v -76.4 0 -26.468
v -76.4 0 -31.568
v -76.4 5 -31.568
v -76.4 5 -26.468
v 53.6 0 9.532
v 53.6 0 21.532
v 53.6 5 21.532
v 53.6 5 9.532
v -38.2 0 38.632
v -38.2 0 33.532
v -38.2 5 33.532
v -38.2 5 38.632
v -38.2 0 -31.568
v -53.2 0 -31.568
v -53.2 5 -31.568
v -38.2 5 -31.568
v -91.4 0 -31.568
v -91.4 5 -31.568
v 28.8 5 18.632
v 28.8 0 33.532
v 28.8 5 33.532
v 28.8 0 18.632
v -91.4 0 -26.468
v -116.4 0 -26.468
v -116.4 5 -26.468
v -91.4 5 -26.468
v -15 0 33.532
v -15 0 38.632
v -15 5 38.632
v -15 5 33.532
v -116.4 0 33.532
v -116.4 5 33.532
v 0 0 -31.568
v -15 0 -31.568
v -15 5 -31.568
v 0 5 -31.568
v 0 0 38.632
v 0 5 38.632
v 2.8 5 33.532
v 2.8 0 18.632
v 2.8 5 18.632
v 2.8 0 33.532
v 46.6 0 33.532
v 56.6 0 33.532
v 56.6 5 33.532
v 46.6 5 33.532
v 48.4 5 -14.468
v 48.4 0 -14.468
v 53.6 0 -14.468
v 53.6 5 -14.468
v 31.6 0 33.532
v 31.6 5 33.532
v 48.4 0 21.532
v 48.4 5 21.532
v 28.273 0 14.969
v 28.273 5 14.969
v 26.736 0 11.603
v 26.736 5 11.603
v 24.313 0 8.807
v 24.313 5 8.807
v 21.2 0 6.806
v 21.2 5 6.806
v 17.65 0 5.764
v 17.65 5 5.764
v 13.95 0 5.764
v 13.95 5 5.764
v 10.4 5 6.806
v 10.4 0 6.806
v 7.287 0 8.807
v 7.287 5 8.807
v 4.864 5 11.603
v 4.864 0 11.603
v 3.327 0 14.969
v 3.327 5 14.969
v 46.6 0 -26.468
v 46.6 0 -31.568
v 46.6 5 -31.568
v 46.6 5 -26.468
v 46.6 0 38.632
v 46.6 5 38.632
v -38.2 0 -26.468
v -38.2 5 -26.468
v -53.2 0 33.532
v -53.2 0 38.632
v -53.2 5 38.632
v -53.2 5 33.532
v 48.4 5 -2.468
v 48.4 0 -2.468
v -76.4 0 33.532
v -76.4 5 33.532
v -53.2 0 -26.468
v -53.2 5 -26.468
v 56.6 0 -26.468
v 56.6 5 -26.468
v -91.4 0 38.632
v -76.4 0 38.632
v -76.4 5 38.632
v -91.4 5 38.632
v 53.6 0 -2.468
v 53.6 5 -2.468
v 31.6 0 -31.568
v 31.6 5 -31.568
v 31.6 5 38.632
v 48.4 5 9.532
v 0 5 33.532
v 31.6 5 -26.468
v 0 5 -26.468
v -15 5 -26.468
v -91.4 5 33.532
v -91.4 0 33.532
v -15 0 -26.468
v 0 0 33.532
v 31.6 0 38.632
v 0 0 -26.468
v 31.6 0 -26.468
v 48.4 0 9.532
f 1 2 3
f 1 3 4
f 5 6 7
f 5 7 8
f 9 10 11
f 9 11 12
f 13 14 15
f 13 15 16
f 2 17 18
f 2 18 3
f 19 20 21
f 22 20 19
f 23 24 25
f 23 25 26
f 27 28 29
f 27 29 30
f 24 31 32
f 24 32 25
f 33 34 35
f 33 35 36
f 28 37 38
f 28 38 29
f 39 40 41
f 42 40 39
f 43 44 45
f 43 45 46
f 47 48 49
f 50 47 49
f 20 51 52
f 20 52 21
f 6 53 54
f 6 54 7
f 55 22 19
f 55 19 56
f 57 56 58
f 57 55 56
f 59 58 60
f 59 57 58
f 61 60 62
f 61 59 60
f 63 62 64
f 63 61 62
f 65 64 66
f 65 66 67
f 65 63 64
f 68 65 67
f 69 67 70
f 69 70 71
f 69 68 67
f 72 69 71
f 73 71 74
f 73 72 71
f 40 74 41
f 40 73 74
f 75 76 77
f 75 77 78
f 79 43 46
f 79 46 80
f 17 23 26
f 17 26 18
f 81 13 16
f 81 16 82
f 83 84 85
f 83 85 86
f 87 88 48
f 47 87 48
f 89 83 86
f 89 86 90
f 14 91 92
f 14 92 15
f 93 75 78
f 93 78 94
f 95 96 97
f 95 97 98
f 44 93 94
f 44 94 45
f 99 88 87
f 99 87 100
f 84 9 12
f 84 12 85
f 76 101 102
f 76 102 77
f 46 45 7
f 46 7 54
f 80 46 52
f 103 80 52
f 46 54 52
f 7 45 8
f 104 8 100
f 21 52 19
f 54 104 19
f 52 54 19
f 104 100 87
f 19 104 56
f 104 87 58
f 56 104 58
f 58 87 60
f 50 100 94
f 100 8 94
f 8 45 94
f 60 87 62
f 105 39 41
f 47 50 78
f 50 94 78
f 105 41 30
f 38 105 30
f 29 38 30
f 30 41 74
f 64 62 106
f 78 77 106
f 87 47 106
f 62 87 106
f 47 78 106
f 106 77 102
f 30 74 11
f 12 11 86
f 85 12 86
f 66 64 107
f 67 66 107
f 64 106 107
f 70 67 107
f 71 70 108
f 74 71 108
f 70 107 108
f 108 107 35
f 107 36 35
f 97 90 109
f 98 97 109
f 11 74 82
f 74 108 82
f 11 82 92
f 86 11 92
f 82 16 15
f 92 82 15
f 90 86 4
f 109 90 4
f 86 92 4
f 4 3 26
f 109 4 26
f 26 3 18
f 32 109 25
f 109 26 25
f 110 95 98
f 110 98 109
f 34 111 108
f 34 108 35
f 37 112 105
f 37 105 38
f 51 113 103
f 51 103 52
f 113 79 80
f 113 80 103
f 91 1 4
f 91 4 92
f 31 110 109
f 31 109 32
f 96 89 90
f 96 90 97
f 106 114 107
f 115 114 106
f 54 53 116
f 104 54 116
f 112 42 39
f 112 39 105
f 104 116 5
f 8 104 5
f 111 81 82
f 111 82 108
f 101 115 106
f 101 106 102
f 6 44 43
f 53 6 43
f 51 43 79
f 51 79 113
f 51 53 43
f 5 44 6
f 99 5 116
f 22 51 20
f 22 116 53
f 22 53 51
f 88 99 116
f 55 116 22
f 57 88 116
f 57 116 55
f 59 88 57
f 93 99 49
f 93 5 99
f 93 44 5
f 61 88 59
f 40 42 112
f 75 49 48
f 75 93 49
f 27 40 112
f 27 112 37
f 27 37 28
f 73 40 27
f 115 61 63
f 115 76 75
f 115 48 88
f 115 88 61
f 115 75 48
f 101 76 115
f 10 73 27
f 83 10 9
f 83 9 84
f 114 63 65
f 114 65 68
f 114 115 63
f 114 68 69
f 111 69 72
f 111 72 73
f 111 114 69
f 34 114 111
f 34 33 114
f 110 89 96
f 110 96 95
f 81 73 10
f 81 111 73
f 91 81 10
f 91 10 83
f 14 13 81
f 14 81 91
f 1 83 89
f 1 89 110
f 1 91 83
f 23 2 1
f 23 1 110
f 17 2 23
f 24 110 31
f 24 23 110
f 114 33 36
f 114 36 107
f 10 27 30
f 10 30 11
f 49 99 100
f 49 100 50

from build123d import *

# Parameters (mm, degrees)
SKETCH1_W           = 5.2
SKETCH1_H           = 12
BOSS_EXTRUDE1_DEPTH = 5


with BuildPart() as part:
    # Sketch1 → Boss-Extrude1 (new body)
    with BuildSketch(Plane(origin=(0, 0, 0), x_dir=(1, 0, 0), z_dir=(0, 1, 0))):
        with BuildLine():
            Line((56.6, 26.468421053), (56.6, -33.531578947))
            Line((56.6, -33.531578947), (46.6, -33.531578947))
            Line((46.6, -33.531578947), (46.6, -38.631578947))
            Line((46.6, -38.631578947), (31.6, -38.631578947))
            Line((31.6, -38.631578947), (31.6, -33.531578947))
            Line((31.6, -33.531578947), (28.8, -33.531578947))
            Line((28.8, -33.531578947), (28.8, -18.631578947))
            ThreePointArc((28.8, -18.631578947), (15.8, -5.631578947), (2.8, -18.631578947))
            Line((2.8, -18.631578947), (2.8, -33.531578947))
            Line((2.8, -33.531578947), (0, -33.531578947))
            Line((0, -33.531578947), (0, -38.631578947))
            Line((0, -38.631578947), (-15, -38.631578947))
            Line((-15, -38.631578947), (-15, -33.531578947))
            Line((-15, -33.531578947), (-38.2, -33.531578947))
            Line((-38.2, -33.531578947), (-38.2, -38.631578947))
            Line((-38.2, -38.631578947), (-53.2, -38.631578947))
            Line((-53.2, -38.631578947), (-53.2, -33.531578947))
            Line((-53.2, -33.531578947), (-76.4, -33.531578947))
            Line((-76.4, -33.531578947), (-76.4, -38.631578947))
            Line((-76.4, -38.631578947), (-91.4, -38.631578947))
            Line((-91.4, -38.631578947), (-91.4, -33.531578947))
            Line((-91.4, -33.531578947), (-116.4, -33.531578947))
            Line((-116.4, -33.531578947), (-116.4, 26.468421053))
            Line((-116.4, 26.468421053), (-91.4, 26.468421053))
            Line((-91.4, 26.468421053), (-91.4, 31.568421053))
            Line((-91.4, 31.568421053), (-76.4, 31.568421053))
            Line((-76.4, 31.568421053), (-76.4, 26.468421053))
            Line((-76.4, 26.468421053), (-53.2, 26.468421053))
            Line((-53.2, 26.468421053), (-53.2, 31.568421053))
            Line((-53.2, 31.568421053), (-38.2, 31.568421053))
            Line((-38.2, 31.568421053), (-38.2, 26.468421053))
            Line((-38.2, 26.468421053), (-15, 26.468421053))
            Line((-15, 26.468421053), (-15, 31.568421053))
            Line((-15, 31.568421053), (0, 31.568421053))
            Line((0, 31.568421053), (0, 26.468421053))
            Line((0, 26.468421053), (31.6, 26.468421053))
            Line((31.6, 26.468421053), (31.6, 31.568421053))
            Line((31.6, 31.568421053), (46.6, 31.568421053))
            Line((46.6, 31.568421053), (46.6, 26.468421053))
            Line((46.6, 26.468421053), (56.6, 26.468421053))
        make_face()
        with Locations((51, 8.468421053)):
            Rectangle(SKETCH1_W, SKETCH1_H, mode=Mode.SUBTRACT)
        with Locations((51, -15.531578947)):
            Rectangle(SKETCH1_W, SKETCH1_H, mode=Mode.SUBTRACT)
    extrude(amount=BOSS_EXTRUDE1_DEPTH)


solid = part.part
